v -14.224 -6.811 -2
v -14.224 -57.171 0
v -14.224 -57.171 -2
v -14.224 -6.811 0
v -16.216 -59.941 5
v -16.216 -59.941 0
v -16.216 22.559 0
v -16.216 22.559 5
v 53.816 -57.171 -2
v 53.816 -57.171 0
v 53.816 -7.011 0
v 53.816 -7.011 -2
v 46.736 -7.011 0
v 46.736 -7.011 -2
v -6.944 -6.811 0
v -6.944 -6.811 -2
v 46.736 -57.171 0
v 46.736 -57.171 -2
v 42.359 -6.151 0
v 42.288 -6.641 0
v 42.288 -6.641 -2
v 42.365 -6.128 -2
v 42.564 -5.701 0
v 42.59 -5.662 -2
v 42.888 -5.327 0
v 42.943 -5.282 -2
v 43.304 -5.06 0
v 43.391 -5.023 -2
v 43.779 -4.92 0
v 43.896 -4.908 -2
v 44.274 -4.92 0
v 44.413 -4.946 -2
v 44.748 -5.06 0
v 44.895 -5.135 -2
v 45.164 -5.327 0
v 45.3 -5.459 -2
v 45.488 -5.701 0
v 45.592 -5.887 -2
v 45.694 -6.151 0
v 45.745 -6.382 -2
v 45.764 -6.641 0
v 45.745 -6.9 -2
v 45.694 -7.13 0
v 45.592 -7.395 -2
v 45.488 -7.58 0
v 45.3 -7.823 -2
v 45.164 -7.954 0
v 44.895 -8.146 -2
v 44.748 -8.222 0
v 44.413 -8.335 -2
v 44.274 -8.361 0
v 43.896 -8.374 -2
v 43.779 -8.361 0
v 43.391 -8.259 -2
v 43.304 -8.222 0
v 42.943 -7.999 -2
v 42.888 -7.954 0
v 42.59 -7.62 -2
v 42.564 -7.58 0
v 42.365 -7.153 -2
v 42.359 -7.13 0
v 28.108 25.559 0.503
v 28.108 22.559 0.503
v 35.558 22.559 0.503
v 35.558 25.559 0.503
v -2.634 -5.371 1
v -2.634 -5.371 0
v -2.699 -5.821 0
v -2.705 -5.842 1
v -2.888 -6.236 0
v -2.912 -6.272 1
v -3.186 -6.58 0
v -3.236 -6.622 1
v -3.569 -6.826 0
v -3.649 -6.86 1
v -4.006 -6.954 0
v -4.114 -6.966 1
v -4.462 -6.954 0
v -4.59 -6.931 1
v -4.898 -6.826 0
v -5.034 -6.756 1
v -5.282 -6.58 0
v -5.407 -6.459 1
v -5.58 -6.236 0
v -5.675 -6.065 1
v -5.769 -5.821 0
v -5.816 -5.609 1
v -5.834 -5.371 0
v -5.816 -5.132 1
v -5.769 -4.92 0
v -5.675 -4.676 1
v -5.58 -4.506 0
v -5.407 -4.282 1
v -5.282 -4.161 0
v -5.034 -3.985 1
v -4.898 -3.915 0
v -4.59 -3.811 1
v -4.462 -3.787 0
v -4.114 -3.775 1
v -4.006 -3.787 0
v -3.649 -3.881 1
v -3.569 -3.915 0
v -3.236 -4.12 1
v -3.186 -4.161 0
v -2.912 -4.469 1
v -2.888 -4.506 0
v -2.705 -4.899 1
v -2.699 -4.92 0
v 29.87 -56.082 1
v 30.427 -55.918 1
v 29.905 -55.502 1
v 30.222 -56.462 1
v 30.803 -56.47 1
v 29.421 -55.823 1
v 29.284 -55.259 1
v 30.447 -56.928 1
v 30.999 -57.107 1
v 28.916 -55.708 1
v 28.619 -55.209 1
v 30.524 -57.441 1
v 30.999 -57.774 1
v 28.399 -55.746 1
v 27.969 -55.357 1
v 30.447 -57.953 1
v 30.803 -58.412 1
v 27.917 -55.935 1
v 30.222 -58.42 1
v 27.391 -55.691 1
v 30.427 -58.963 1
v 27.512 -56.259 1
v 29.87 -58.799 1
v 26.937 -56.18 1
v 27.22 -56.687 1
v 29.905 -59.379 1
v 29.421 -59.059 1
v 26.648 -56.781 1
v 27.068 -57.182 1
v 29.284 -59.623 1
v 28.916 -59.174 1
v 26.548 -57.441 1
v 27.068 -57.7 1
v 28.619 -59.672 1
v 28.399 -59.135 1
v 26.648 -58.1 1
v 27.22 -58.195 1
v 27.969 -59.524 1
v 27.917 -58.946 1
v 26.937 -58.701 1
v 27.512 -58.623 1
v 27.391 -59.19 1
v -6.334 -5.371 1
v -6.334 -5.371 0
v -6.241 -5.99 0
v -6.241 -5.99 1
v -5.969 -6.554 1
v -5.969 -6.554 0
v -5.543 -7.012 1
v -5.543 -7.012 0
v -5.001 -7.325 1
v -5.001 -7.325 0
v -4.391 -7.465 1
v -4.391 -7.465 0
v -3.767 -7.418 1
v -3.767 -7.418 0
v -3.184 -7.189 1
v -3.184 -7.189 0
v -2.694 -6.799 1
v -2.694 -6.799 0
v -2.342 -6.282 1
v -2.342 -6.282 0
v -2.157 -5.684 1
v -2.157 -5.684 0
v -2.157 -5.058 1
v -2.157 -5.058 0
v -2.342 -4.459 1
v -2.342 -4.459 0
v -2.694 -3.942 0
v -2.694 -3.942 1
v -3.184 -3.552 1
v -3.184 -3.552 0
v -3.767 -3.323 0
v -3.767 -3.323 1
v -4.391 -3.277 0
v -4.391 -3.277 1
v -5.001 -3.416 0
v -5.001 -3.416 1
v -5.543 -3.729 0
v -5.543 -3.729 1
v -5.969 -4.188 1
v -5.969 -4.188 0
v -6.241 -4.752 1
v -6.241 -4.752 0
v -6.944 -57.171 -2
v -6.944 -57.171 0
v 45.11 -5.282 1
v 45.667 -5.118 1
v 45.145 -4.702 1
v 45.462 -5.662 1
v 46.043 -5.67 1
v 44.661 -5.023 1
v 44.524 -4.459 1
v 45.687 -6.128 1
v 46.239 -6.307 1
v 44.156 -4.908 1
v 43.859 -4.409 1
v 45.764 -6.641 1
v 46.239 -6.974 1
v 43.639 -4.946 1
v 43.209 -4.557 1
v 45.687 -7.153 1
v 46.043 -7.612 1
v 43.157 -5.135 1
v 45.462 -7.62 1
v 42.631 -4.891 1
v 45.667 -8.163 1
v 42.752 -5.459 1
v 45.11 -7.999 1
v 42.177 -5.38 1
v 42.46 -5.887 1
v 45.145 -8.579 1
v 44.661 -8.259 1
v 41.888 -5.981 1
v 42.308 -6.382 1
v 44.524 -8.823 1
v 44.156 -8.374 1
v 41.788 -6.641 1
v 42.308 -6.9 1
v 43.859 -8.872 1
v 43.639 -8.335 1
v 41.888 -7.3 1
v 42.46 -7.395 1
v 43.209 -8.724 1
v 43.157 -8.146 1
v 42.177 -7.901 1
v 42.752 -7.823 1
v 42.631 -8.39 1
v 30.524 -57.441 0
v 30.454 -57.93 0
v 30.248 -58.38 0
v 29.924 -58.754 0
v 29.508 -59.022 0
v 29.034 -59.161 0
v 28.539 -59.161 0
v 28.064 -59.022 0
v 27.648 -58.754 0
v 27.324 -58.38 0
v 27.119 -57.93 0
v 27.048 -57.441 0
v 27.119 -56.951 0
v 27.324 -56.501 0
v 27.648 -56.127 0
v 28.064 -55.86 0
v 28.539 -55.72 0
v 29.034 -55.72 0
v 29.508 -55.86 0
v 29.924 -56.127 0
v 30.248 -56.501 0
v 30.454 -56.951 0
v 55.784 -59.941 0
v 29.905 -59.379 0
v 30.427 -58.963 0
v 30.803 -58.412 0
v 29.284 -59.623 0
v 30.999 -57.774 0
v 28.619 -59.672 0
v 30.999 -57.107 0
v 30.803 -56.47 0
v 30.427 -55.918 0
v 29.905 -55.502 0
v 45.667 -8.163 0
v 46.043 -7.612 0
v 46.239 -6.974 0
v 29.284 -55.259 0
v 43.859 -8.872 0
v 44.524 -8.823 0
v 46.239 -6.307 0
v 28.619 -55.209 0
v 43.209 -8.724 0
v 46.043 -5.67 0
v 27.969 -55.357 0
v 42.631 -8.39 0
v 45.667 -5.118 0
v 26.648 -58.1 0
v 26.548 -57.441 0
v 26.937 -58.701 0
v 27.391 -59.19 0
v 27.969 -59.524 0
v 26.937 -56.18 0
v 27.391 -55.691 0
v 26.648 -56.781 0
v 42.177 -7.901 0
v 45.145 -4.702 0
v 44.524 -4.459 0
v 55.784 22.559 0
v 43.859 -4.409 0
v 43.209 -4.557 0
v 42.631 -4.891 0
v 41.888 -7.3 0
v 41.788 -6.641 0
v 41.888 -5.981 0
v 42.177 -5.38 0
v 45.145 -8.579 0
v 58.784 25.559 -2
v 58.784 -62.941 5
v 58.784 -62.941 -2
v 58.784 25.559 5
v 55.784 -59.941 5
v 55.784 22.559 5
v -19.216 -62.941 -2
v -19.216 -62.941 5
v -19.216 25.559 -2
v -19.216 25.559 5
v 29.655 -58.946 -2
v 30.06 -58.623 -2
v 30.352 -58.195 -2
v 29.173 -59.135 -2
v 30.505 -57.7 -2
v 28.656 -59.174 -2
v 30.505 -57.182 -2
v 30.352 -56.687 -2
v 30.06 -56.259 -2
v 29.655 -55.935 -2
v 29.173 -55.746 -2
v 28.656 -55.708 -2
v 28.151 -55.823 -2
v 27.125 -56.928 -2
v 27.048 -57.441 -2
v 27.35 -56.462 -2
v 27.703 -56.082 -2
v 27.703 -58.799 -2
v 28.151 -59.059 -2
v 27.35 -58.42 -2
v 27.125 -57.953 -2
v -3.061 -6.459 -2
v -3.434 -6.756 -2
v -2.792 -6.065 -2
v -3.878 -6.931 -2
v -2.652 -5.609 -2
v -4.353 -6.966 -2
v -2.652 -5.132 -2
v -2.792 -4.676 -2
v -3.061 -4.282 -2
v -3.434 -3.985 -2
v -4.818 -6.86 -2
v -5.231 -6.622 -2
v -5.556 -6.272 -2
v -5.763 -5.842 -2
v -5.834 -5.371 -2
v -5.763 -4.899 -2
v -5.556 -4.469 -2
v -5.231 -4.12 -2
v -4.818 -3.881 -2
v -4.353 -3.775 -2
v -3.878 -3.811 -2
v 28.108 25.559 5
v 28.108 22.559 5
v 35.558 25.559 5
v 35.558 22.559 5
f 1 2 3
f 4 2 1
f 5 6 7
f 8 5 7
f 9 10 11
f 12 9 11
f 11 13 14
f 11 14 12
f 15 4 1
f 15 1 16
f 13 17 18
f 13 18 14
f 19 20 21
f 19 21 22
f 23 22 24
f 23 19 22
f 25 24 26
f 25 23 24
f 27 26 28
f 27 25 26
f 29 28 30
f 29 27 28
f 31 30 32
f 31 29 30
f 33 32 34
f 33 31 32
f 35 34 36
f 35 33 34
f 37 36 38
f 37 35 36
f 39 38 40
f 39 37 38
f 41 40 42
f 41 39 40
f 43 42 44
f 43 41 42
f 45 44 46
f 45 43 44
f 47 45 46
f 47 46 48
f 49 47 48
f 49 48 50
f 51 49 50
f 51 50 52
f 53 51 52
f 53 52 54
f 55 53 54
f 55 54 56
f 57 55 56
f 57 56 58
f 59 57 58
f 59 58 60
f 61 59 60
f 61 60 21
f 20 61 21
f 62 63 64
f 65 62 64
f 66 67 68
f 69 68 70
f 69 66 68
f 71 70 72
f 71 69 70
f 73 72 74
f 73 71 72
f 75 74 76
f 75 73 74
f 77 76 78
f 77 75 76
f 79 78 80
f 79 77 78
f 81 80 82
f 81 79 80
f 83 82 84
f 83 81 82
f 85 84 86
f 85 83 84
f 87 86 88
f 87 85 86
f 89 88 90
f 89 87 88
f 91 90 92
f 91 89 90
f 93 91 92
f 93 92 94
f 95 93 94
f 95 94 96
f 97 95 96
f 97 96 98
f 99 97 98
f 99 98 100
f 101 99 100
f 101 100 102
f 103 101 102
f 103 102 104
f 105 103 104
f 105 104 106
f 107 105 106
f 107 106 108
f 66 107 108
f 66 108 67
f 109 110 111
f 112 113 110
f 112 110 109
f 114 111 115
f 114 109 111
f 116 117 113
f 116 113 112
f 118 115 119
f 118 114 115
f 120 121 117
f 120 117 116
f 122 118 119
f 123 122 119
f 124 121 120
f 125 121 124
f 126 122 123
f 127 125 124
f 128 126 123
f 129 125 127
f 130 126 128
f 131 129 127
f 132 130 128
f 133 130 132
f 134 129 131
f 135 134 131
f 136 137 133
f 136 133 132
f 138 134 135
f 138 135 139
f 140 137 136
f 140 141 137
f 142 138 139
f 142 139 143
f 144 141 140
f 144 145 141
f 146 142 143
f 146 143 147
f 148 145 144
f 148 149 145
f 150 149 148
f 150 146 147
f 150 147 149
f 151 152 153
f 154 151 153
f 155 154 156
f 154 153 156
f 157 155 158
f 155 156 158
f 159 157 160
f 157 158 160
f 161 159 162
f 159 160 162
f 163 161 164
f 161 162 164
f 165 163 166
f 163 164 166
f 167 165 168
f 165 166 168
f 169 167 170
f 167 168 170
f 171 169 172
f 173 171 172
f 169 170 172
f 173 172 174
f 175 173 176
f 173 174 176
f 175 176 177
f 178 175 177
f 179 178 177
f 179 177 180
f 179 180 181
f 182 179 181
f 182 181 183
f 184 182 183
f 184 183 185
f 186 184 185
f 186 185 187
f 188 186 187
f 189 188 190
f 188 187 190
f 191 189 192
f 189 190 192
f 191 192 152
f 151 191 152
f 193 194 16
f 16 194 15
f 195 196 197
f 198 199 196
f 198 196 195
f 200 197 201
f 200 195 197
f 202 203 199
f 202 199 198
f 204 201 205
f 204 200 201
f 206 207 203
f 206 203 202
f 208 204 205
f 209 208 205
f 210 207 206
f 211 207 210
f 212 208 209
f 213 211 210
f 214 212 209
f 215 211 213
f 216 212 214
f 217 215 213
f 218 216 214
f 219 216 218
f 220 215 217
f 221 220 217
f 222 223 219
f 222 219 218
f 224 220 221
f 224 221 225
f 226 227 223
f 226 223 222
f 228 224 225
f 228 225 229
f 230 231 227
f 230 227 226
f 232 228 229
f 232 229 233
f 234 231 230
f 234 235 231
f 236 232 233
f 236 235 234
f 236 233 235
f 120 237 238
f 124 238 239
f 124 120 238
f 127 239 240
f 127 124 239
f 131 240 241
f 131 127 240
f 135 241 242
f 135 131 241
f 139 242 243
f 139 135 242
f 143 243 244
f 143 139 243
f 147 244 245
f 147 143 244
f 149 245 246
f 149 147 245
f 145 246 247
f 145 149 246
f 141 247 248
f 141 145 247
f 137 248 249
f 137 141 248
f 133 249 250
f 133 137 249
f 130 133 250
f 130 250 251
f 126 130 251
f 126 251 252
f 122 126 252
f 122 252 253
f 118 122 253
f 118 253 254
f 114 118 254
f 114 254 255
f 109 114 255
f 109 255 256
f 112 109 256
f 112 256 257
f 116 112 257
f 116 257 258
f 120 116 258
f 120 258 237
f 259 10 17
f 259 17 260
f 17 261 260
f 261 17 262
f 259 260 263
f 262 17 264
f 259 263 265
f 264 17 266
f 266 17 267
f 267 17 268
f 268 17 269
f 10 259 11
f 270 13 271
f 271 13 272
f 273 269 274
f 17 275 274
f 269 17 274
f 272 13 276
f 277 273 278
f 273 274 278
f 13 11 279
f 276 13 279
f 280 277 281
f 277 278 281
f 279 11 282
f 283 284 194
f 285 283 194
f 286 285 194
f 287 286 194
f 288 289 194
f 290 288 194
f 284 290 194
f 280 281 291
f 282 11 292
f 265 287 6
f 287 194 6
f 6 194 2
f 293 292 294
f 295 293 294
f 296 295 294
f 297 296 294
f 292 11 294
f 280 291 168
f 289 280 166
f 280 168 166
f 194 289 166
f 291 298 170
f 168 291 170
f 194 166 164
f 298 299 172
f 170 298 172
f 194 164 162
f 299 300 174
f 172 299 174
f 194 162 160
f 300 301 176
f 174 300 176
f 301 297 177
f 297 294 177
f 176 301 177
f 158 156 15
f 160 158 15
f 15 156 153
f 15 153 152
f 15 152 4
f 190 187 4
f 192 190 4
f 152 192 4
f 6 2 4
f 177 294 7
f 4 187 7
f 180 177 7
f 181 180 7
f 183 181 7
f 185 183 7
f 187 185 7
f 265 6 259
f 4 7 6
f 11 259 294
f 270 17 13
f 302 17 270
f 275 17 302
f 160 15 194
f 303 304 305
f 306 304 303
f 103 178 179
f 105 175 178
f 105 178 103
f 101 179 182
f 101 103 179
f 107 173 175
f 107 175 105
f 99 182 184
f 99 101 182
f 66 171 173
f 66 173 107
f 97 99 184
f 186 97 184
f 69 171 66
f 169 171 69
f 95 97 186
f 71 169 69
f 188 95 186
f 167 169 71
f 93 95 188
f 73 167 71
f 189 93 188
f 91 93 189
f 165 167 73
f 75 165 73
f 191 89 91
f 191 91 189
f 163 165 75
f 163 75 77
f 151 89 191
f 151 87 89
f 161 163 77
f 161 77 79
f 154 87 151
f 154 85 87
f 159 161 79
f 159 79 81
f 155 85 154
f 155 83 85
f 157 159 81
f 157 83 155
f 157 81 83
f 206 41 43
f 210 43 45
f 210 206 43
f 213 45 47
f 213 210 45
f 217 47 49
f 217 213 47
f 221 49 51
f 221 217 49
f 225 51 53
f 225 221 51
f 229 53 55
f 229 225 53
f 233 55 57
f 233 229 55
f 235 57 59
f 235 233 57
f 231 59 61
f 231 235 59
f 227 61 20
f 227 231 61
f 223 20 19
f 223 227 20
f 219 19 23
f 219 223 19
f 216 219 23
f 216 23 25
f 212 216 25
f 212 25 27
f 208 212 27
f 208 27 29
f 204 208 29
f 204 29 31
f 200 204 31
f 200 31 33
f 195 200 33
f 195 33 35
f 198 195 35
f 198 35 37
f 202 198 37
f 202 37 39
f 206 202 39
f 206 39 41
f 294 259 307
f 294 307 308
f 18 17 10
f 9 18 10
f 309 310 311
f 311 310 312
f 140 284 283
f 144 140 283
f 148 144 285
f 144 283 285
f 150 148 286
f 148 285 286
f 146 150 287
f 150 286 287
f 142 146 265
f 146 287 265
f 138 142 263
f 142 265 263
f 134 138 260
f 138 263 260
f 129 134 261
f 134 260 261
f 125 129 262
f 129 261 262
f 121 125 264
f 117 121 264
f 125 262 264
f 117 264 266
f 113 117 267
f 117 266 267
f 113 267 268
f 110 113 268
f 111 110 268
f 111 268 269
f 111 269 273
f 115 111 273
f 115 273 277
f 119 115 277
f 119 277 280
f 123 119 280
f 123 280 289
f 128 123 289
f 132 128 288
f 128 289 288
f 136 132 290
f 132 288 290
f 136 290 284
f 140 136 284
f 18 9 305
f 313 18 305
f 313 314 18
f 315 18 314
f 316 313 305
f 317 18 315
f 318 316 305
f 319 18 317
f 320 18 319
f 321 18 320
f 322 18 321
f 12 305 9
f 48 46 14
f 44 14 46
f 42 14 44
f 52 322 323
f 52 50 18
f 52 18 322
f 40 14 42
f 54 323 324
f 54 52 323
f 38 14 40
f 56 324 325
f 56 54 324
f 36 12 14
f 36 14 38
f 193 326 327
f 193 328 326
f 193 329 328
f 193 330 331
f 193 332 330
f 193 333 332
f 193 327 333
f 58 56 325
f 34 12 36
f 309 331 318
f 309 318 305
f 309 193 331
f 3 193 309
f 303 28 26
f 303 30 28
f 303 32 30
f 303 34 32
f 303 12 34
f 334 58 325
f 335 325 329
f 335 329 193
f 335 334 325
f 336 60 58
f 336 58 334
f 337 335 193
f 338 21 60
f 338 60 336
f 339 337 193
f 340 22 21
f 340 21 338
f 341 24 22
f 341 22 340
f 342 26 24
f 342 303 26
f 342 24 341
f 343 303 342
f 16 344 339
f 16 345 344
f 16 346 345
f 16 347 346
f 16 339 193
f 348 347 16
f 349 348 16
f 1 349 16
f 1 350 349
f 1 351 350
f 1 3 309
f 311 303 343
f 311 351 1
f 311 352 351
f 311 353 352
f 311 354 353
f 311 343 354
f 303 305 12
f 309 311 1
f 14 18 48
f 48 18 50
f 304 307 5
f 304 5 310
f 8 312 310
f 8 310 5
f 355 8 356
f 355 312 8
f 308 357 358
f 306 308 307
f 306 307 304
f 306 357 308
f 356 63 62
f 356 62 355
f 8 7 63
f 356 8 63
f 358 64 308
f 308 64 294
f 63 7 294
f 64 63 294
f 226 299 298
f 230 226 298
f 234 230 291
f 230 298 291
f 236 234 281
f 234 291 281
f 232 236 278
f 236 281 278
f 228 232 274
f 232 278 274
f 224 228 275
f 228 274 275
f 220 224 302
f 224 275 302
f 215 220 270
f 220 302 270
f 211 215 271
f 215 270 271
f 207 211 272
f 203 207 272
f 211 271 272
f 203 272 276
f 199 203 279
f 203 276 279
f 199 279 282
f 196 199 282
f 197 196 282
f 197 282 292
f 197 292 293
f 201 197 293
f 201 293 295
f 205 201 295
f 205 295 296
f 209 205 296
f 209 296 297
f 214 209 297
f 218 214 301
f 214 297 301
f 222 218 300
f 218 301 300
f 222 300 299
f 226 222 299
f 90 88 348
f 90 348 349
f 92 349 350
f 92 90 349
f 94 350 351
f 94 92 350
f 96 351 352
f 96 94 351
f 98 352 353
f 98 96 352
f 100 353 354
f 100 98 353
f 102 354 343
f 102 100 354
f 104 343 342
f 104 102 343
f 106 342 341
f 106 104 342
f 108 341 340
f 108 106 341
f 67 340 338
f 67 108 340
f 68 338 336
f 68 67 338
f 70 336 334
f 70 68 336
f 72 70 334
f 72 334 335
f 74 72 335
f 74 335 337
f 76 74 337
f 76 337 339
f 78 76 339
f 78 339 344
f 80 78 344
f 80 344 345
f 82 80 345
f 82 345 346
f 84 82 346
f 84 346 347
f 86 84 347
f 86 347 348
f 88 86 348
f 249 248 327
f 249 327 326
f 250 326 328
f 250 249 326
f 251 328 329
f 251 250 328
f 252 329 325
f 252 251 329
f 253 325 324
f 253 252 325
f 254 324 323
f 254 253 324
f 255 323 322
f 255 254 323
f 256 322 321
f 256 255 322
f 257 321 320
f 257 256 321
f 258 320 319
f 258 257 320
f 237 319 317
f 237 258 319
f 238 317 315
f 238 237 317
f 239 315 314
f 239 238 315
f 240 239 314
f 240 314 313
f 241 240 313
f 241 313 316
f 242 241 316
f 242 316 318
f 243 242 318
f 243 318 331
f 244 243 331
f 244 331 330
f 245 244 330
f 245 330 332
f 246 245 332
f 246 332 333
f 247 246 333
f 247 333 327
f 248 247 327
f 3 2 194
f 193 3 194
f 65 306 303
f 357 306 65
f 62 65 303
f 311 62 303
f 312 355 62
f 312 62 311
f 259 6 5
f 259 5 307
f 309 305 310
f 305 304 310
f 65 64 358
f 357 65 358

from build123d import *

# Parameters (mm, degrees)
SKETCH1_W           = 78
SKETCH1_H           = 88.5
SKETCH1_W_2         = 72
SKETCH1_H_2         = 82.5
BOSS_EXTRUDE1_DEPTH = 5
SKETCH2_W           = 78
SKETCH2_H           = 88.5
SKETCH2_R           = 1.6
SKETCH2_R_2         = 1.738
BOSS_EXTRUDE2_DEPTH = 2
SKETCH7_W           = 7.279998142
SKETCH7_H           = 50.36
SKETCH7_W_2         = 7.079999996
SKETCH7_H_2         = 50.160000192
CUT_EXTRUDE1_DEPTH  = 15
SKETCH9_W           = 7.45
SKETCH9_H           = 4.497118046
CUT_EXTRUDE7_DEPTH  = 16
SKETCH10_R          = 2.1
SKETCH10_R_2        = 2.238
BOSS_EXTRUDE4_DEPTH = 1
CUT_EXTRUDE8_START  = -15
SKETCH11_R          = 1.738
SKETCH11_R_2        = 1.6
CUT_EXTRUDE8_DEPTH  = 15


with BuildPart() as part:
    # Sketch1 → Boss-Extrude1 (new body)
    with BuildSketch(Plane.XY):
        with Locations((19.784172662, -18.690647482)):
            Rectangle(SKETCH1_W, SKETCH1_H)
        with Locations((19.784172662, -18.690647482)):
            Rectangle(SKETCH1_W_2, SKETCH1_H_2, mode=Mode.SUBTRACT)
    extrude(amount=BOSS_EXTRUDE1_DEPTH)

    # Sketch2 → Boss-Extrude2 (add)
    with BuildSketch(Plane(origin=(0, 0, 0), x_dir=(-1, 0, 0), z_dir=(0, 0, -1))):
        with Locations((-19.784172662, -18.690647482)):
            Rectangle(SKETCH2_W, SKETCH2_H)
        with Locations((4.233803916, -5.370645303)):
            Circle(SKETCH2_R, mode=Mode.SUBTRACT)
        with Locations((-44.026196036, -6.640647161)):
            Circle(SKETCH2_R_2, mode=Mode.SUBTRACT)
        with Locations((-28.78619408, -57.440646574)):
            Circle(SKETCH2_R_2, mode=Mode.SUBTRACT)
    extrude(amount=BOSS_EXTRUDE2_DEPTH)

    # Sketch7 → Cut-Extrude1 (cut)
    with BuildSketch(Plane.XY):
        with Locations((-10.583804942, -31.990645157)):
            Rectangle(SKETCH7_W, SKETCH7_H)
        with Locations((50.276195985, -32.090647407)):
            Rectangle(SKETCH7_W_2, SKETCH7_H_2)
    extrude(amount=-CUT_EXTRUDE1_DEPTH, mode=Mode.SUBTRACT)

    # Sketch9 → Cut-Extrude7 (cut)
    with BuildSketch(Plane.XZ.offset(-22.559352518)):
        with Locations((31.833296536, 2.751440977)):
            Rectangle(SKETCH9_W, SKETCH9_H)
    extrude(amount=-CUT_EXTRUDE7_DEPTH, mode=Mode.SUBTRACT)

    # Sketch10 → Boss-Extrude4 (add)
    with BuildSketch(Plane.XY):
        with Locations(Location((-4.233803916, -5.370645303, 0), (0, 0, 180))):
            Circle(SKETCH10_R)
        with Locations(Location((44.026196036, -6.640647161, 0), (0, 0, 180))):
            Circle(SKETCH10_R_2)
        with Locations(Location((28.78619408, -57.440646574, 0), (0, 0, 180))):
            Circle(SKETCH10_R_2)
    extrude(amount=BOSS_EXTRUDE4_DEPTH)

    # Sketch11 → Cut-Extrude8 (cut)
    with BuildSketch(Plane(origin=(0, 0, 0), x_dir=(-1, 0, 0), z_dir=(0, 0, -1)).offset(CUT_EXTRUDE8_START)):
        with Locations(Location((-44.026196036, -6.640647161, 0), (0, 0, 180))):
            Circle(SKETCH11_R)
        with Locations(Location((4.233803916, -5.370645303, 0), (0, 0, 180))):
            Circle(SKETCH11_R_2)
        with Locations(Location((-28.78619408, -57.440646574, 0), (0, 0, 180))):
            Circle(SKETCH11_R)
    extrude(amount=CUT_EXTRUDE8_DEPTH, mode=Mode.SUBTRACT)


solid = part.part
